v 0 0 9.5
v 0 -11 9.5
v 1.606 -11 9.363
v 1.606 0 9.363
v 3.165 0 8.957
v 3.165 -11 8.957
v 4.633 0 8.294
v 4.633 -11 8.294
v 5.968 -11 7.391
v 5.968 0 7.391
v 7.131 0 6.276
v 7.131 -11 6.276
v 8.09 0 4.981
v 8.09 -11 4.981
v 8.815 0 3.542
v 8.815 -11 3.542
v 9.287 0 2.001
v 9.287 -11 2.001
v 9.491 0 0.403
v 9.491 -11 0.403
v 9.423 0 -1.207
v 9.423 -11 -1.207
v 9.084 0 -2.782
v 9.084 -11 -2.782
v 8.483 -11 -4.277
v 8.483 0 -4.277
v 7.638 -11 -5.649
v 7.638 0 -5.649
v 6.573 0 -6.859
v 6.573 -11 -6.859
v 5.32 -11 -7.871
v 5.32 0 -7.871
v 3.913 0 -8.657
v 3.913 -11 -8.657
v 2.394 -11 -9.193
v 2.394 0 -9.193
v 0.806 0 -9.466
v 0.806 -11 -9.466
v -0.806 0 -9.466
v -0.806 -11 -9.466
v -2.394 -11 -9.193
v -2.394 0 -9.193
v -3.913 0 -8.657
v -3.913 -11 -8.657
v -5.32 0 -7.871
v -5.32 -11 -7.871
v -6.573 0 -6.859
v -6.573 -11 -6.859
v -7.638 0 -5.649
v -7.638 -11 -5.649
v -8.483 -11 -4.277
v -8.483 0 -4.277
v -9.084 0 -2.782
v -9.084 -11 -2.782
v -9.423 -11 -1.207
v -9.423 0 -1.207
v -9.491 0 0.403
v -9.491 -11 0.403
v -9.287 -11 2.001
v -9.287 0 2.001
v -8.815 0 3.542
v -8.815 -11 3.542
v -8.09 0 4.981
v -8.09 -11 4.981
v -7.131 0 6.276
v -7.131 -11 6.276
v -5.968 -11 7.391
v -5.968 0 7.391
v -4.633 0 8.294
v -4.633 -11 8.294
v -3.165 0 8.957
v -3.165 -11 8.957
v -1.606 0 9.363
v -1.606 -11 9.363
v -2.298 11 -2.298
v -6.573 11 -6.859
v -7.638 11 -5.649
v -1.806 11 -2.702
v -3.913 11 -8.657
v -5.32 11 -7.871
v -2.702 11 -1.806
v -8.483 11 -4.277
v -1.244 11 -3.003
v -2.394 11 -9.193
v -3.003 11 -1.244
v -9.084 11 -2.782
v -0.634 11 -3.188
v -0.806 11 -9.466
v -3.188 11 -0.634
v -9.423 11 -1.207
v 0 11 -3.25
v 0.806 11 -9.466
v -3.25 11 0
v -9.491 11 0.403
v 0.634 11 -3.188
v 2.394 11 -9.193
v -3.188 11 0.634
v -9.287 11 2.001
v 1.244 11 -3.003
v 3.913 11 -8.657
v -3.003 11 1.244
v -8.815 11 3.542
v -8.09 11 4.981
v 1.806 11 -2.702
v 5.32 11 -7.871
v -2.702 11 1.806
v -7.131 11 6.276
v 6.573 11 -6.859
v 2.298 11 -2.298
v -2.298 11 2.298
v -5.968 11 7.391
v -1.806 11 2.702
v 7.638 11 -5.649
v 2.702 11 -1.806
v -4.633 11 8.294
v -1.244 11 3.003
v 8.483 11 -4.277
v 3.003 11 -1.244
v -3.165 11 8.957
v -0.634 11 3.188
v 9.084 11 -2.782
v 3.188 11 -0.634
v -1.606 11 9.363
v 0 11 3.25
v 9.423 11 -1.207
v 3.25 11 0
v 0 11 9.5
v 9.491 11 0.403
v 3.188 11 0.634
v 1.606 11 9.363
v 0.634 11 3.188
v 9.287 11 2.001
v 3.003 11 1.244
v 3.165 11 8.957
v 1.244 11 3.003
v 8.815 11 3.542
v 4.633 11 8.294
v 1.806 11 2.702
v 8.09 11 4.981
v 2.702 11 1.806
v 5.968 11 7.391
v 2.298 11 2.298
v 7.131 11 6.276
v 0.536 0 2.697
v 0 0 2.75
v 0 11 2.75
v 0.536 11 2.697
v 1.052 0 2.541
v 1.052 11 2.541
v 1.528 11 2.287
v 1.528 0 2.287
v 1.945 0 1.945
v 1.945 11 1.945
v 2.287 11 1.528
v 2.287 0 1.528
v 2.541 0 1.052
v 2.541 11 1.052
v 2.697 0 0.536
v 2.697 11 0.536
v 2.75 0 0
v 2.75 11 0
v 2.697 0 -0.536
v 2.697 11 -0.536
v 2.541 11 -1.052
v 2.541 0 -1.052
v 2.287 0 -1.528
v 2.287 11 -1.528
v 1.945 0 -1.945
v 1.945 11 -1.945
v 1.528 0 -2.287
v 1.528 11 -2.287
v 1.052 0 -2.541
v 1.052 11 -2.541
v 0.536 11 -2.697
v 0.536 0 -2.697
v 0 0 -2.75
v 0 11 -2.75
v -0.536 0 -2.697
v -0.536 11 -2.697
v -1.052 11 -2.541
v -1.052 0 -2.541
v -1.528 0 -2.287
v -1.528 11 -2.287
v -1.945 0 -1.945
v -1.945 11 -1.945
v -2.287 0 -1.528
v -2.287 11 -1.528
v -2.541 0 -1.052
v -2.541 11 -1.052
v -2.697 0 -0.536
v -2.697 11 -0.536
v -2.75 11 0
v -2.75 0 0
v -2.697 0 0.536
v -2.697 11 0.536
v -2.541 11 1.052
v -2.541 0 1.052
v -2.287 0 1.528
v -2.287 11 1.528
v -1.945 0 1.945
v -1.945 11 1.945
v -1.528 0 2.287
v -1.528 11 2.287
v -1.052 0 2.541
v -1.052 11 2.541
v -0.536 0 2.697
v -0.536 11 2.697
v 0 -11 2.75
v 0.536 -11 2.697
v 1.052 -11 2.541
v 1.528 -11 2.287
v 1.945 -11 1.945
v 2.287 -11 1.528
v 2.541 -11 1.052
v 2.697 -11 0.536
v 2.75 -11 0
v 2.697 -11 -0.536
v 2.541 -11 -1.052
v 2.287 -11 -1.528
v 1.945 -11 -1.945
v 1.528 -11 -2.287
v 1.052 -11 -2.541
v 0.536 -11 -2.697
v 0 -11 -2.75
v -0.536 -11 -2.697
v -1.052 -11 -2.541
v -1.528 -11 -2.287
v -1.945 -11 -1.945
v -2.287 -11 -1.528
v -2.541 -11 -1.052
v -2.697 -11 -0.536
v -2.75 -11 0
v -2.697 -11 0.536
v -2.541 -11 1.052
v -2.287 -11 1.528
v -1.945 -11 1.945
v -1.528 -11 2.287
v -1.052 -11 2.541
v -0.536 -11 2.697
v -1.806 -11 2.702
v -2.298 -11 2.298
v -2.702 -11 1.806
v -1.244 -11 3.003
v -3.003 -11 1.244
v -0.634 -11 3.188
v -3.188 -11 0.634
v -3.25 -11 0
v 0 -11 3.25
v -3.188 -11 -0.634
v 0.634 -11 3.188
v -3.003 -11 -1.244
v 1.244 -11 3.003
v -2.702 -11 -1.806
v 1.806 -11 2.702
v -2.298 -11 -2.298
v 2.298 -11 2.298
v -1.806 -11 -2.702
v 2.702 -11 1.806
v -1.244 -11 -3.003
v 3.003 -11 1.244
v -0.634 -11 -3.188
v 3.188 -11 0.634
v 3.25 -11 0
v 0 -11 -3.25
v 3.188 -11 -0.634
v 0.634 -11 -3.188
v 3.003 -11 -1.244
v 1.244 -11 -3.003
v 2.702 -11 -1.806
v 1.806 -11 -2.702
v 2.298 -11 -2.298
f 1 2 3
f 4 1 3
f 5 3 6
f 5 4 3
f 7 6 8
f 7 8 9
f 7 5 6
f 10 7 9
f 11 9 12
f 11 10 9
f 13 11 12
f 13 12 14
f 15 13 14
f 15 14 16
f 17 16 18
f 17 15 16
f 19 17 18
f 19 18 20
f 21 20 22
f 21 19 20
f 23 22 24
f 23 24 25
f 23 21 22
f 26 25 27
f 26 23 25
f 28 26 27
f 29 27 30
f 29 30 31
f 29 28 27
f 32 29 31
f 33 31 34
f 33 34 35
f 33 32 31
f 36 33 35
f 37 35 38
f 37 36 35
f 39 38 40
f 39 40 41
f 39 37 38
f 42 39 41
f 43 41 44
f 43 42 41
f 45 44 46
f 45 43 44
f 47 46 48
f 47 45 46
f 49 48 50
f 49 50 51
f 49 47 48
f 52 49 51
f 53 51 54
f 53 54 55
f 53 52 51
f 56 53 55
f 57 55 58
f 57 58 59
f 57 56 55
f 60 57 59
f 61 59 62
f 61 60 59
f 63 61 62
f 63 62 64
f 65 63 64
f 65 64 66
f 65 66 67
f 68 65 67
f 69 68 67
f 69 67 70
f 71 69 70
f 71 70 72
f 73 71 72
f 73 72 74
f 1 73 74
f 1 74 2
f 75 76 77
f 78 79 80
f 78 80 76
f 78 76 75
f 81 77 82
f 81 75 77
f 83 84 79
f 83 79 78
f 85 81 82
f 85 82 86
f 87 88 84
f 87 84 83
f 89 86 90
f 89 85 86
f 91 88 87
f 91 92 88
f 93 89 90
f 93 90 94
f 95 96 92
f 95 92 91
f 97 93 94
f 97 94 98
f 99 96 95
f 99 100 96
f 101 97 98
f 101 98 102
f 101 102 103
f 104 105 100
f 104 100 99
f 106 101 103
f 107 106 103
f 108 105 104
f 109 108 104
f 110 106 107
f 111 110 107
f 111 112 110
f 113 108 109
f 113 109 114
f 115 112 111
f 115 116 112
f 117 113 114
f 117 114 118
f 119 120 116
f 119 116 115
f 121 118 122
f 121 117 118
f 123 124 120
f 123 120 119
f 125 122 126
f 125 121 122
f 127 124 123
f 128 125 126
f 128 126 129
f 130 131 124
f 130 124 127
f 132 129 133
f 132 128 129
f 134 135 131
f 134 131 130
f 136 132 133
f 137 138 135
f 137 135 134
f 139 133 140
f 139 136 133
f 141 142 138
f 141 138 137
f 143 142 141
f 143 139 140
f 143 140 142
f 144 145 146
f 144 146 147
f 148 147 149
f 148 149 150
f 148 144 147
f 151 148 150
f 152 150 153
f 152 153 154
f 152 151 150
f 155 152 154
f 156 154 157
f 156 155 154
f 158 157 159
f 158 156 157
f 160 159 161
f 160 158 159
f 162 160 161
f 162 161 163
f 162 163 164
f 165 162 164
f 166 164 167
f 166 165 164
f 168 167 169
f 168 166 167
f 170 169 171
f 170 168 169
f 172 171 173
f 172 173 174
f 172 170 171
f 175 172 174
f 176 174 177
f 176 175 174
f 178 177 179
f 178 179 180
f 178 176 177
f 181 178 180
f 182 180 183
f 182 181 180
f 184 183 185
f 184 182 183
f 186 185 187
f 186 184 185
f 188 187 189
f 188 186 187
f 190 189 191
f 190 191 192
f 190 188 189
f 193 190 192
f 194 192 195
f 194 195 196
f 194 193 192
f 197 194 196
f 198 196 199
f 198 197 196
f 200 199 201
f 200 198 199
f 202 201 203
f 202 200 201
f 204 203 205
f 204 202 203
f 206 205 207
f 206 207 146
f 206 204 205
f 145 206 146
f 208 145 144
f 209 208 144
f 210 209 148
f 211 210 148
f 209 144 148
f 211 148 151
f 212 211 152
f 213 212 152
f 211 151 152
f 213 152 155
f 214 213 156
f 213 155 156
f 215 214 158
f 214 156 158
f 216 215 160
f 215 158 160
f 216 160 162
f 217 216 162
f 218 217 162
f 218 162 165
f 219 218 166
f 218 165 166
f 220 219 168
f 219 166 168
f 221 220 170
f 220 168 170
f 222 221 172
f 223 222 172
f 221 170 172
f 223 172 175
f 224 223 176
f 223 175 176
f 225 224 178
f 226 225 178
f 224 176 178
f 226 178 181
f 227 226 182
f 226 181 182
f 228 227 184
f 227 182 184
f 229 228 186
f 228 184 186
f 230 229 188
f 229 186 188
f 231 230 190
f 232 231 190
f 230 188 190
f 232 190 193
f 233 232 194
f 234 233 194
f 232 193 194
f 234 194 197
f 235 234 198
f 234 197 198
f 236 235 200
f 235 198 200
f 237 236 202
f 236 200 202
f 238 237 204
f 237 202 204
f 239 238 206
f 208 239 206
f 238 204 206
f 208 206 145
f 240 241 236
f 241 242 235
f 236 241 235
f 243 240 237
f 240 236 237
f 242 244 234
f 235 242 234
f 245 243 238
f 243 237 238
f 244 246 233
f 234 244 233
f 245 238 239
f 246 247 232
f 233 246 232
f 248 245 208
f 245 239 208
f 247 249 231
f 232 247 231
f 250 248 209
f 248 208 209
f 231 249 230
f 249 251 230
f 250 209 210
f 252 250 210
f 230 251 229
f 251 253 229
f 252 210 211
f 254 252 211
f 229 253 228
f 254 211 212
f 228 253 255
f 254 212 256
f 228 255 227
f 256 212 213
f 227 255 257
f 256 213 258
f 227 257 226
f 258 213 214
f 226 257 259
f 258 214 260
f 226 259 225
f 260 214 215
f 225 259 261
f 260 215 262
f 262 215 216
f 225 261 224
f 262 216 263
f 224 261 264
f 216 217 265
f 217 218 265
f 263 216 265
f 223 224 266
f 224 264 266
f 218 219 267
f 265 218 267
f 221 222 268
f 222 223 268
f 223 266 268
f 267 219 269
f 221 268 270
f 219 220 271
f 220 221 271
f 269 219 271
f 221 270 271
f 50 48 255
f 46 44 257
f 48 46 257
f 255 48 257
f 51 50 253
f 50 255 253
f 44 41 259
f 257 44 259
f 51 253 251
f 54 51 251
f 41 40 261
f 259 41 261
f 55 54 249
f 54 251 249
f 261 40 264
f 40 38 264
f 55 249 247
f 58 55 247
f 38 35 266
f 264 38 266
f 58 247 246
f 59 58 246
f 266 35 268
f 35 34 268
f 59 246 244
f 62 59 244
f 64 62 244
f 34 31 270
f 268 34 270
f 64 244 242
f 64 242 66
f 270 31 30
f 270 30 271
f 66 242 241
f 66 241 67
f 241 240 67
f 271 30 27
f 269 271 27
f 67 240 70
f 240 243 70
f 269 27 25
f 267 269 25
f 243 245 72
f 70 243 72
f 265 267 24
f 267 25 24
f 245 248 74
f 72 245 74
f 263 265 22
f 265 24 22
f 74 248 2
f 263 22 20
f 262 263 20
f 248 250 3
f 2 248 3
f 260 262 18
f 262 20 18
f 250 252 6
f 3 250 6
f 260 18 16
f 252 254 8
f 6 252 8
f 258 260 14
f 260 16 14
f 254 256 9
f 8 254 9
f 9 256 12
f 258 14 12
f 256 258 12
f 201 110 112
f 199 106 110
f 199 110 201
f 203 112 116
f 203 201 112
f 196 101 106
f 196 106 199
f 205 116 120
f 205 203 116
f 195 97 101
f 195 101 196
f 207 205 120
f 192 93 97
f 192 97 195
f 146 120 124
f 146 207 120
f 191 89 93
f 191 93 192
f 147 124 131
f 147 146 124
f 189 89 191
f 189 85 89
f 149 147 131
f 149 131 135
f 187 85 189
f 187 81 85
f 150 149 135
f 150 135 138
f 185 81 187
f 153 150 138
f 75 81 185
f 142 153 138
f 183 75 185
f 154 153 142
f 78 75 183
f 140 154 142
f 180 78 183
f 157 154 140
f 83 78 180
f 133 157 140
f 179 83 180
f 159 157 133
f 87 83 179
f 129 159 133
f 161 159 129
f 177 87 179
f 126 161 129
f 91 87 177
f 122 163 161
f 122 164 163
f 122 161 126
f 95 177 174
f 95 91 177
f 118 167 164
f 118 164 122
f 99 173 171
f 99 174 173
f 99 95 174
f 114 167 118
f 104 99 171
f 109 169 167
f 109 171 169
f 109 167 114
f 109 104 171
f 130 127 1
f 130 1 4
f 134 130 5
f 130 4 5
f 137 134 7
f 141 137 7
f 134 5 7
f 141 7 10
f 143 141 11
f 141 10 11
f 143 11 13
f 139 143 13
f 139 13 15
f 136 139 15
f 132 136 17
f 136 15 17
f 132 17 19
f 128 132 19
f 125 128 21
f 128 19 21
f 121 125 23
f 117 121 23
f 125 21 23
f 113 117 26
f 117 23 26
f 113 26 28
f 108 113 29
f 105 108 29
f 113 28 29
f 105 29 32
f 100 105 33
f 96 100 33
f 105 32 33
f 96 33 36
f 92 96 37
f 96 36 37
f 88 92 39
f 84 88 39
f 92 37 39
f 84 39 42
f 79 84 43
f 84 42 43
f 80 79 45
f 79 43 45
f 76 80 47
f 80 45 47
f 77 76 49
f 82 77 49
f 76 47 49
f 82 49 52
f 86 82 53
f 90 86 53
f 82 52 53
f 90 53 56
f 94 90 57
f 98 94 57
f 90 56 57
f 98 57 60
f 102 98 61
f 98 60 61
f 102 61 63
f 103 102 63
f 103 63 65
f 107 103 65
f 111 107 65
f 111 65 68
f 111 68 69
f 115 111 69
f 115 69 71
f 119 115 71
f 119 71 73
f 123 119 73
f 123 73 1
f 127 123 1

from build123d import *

# Parameters (mm, degrees)
ESBO_O1_R                = 9.5
ESBO_O1_R_2              = 3.25
ESBO_O1_R_3              = 2.75
RESSALTO_EXTRUS_O1_DEPTH = 11


with BuildPart() as part:
    # Esboço1 → Ressalto-extrusão1 (new, symmetric)
    # profile 1 of 2: a face of its own
    with BuildSketch(Plane(origin=(0, 0, 0), x_dir=(1, 0, 0), z_dir=(0, 1, 0))):
        with Locations(Location((0, 0, 0), (0, 0, 270))):
            Circle(ESBO_O1_R)
        Circle(ESBO_O1_R_2, mode=Mode.SUBTRACT)
    # profile 2 of 2: a face of its own
    with BuildSketch(Plane(origin=(0, 0, 0), x_dir=(1, 0, 0), z_dir=(0, 1, 0))):
        Circle(ESBO_O1_R_2)
        with Locations(Location((0, 0, 0), (0, 0, 270))):
            Circle(ESBO_O1_R_3, mode=Mode.SUBTRACT)
    extrude(amount=RESSALTO_EXTRUS_O1_DEPTH, both=True)


solid = part.part
